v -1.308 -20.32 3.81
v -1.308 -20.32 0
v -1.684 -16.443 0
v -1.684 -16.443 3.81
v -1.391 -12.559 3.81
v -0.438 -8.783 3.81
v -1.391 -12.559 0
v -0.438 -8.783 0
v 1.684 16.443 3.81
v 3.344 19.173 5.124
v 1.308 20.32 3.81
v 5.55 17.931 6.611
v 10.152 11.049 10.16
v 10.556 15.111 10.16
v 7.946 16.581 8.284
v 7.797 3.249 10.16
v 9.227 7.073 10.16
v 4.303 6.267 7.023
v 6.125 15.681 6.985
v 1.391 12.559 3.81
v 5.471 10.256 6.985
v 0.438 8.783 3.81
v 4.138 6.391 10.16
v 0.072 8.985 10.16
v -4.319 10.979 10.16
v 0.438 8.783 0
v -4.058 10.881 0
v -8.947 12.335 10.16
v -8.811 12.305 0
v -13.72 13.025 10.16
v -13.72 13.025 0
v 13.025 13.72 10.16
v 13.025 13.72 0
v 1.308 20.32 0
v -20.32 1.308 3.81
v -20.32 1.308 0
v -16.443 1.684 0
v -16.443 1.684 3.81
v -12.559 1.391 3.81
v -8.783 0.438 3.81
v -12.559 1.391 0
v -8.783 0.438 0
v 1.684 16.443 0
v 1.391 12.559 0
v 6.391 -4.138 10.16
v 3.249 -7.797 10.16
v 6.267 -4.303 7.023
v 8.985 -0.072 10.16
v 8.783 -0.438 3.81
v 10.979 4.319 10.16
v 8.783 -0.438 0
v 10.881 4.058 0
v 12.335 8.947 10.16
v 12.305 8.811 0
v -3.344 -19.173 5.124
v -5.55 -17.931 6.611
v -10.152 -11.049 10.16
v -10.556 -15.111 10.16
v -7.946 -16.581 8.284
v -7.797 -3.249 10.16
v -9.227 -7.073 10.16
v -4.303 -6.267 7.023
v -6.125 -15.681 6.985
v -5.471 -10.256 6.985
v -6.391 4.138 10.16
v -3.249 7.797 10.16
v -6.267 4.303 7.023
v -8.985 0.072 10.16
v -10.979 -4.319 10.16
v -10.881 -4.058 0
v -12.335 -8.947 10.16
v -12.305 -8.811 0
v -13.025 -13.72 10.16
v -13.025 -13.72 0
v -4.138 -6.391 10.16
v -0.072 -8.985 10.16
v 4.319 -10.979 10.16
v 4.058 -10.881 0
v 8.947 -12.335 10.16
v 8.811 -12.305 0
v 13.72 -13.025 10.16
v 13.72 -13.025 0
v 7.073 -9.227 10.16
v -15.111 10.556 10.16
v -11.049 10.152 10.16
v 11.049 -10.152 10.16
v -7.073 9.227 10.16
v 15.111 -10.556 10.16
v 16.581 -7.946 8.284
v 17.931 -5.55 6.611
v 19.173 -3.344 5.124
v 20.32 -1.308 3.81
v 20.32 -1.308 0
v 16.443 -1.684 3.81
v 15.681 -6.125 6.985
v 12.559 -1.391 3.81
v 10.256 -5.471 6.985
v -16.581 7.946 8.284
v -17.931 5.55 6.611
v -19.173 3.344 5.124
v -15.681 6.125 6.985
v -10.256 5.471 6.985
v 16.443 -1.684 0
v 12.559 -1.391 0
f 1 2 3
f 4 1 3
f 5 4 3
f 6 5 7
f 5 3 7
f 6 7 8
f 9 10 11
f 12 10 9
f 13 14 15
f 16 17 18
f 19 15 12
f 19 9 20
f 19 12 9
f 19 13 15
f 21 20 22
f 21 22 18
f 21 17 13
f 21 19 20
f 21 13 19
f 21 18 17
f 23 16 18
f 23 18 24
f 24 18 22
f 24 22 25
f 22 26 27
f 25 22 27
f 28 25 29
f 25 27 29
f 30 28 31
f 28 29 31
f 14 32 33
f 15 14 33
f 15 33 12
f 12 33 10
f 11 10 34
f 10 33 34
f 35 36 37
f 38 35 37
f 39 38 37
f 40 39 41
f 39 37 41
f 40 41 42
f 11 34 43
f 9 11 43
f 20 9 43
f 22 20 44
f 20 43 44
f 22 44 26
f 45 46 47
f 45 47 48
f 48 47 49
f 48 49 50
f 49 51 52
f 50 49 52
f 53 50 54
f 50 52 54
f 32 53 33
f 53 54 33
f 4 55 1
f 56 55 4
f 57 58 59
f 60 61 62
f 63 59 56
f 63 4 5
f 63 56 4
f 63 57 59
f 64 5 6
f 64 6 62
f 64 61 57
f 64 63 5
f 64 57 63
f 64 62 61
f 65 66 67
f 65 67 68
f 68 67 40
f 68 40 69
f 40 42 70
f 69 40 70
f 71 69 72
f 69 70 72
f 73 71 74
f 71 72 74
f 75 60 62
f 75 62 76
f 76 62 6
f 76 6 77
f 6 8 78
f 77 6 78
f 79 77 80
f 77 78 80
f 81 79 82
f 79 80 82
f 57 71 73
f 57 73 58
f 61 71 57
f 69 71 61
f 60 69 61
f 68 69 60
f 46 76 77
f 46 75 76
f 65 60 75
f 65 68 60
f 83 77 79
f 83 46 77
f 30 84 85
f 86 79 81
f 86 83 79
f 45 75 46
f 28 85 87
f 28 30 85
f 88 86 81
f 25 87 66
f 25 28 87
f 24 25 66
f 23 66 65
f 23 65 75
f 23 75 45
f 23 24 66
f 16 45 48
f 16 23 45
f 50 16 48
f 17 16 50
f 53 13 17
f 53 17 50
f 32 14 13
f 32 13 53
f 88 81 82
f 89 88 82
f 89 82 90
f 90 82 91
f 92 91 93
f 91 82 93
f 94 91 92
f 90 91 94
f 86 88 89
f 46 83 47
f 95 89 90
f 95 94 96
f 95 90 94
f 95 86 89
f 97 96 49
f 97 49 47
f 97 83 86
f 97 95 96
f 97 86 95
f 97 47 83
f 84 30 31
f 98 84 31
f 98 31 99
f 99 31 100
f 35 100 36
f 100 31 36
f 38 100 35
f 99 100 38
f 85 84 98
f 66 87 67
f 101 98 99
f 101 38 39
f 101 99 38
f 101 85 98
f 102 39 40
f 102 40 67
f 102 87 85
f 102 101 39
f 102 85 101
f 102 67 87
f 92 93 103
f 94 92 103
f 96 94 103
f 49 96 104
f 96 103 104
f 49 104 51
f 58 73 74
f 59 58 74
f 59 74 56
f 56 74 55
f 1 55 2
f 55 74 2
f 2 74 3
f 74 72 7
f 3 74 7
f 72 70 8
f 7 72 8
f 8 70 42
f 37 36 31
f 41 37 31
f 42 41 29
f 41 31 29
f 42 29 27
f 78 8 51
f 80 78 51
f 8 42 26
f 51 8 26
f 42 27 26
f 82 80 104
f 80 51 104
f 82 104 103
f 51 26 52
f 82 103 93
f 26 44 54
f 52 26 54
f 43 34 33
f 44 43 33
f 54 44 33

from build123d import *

# Parameters (mm, degrees)
F1_DEPTH   = 10.16
F2_SIZE2   = 8.89
F2_SIZE    = 6.35
F2_2_SIZE2 = 8.89
F2_2_SIZE  = 6.35
F2_3_SIZE2 = 8.89
F2_3_SIZE  = 6.35
F2_4_SIZE2 = 8.89
F2_4_SIZE  = 6.35


with BuildPart() as f1:
    # F0 (on Top) → F1 (new body)
    with BuildSketch(Plane.XY):
        with BuildLine():
            ThreePointArc((8.7829506919, -0.4383031513), (8.1984738627, -0.2271154175), (7.62, 0))
            ThreePointArc((7.62, 0), (7.3212709923, -2.1126739117), (6.4485062842, -4.0597003218))
            ThreePointArc((6.4485062842, -4.0597003218), (7.6729486494, -2.2858873029), (8.7829506919, -0.4383031513))
        make_face()
        with BuildLine():
            ThreePointArc((4.0597003218, 6.4485062842), (6.670806415, 3.6830343161), (7.62, 0))
            ThreePointArc((7.62, 0), (8.1984738627, -0.2271154175), (8.7829506919, -0.4383031513))
            ThreePointArc((8.7829506919, -0.4383031513), (11.6797251248, 6.4085522926), (13.0247462226, 13.7202996782))
            Line((13.0247462226, 13.7202996782), (1.3079377533, 20.32))
            ThreePointArc((1.3079377533, 20.32), (1.6208295824, 14.4951148577), (0.4383031513, 8.7829506919))
            ThreePointArc((0.4383031513, 8.7829506919), (2.2858873029, 7.6729486494), (4.0597003218, 6.4485062842))
        make_face()
        with BuildLine():
            ThreePointArc((0, 7.62), (2.1126739117, 7.3212709923), (4.0597003218, 6.4485062842))
            ThreePointArc((4.0597003218, 6.4485062842), (2.2858873029, 7.6729486494), (0.4383031513, 8.7829506919))
            ThreePointArc((0.4383031513, 8.7829506919), (0.2271154175, 8.1984738627), (0, 7.62))
        make_face()
        with BuildLine():
            ThreePointArc((8.7829506919, -0.4383031513), (7.6729486494, -2.2858873029), (6.4485062842, -4.0597003218))
            ThreePointArc((6.4485062842, -4.0597003218), (3.6830343161, -6.670806415), (0, -7.62))
            ThreePointArc((0, -7.62), (-0.2271154175, -8.1984738627), (-0.4383031513, -8.7829506919))
            ThreePointArc((-0.4383031513, -8.7829506919), (6.4085522926, -11.6797251248), (13.7202996782, -13.0247462226))
            Line((13.7202996782, -13.0247462226), (20.32, -1.3079377533))
            ThreePointArc((20.32, -1.3079377533), (14.4951148577, -1.6208295824), (8.7829506919, -0.4383031513))
        make_face()
        with BuildLine():
            ThreePointArc((-6.4485062842, 4.0597003218), (-3.6830343161, 6.670806415), (0, 7.62))
            ThreePointArc((0, 7.62), (0.2271154175, 8.1984738627), (0.4383031513, 8.7829506919))
            ThreePointArc((0.4383031513, 8.7829506919), (-6.4085522926, 11.6797251248), (-13.7202996782, 13.0247462226))
            Line((-13.7202996782, 13.0247462226), (-20.32, 1.3079377533))
            ThreePointArc((-20.32, 1.3079377533), (-14.4951148577, 1.6208295824), (-8.7829506919, 0.4383031513))
            ThreePointArc((-8.7829506919, 0.4383031513), (-7.6729486494, 2.2858873029), (-6.4485062842, 4.0597003218))
        make_face()
        with BuildLine():
            ThreePointArc((-0.4383031513, -8.7829506919), (-0.2271154175, -8.1984738627), (0, -7.62))
            ThreePointArc((0, -7.62), (-2.1126739117, -7.3212709923), (-4.0597003218, -6.4485062842))
            ThreePointArc((-4.0597003218, -6.4485062842), (-2.2858873029, -7.6729486494), (-0.4383031513, -8.7829506919))
        make_face()
        with BuildLine():
            ThreePointArc((-7.62, 0), (-7.3212709923, 2.1126739117), (-6.4485062842, 4.0597003218))
            ThreePointArc((-6.4485062842, 4.0597003218), (-7.6729486494, 2.2858873029), (-8.7829506919, 0.4383031513))
            ThreePointArc((-8.7829506919, 0.4383031513), (-8.1984738627, 0.2271154175), (-7.62, 0))
        make_face()
        with BuildLine():
            ThreePointArc((-0.4383031513, -8.7829506919), (-2.2858873029, -7.6729486494), (-4.0597003218, -6.4485062842))
            ThreePointArc((-4.0597003218, -6.4485062842), (-6.670806415, -3.6830343161), (-7.62, 0))
            ThreePointArc((-7.62, 0), (-8.1984738627, 0.2271154175), (-8.7829506919, 0.4383031513))
            ThreePointArc((-8.7829506919, 0.4383031513), (-11.6797251248, -6.4085522926), (-13.0247462226, -13.7202996782))
            Line((-13.0247462226, -13.7202996782), (-1.3079377533, -20.32))
            ThreePointArc((-1.3079377533, -20.32), (-1.6208295824, -14.4951148577), (-0.4383031513, -8.7829506919))
        make_face()
        with BuildLine():
            ThreePointArc((6.4485062842, -4.0597003218), (7.3212709923, -2.1126739117), (7.62, 0))
            ThreePointArc((7.62, 0), (6.670806415, 3.6830343161), (4.0597003218, 6.4485062842))
            ThreePointArc((4.0597003218, 6.4485062842), (2.1126739117, 7.3212709923), (0, 7.62))
            ThreePointArc((0, 7.62), (-3.6830343161, 6.670806415), (-6.4485062842, 4.0597003218))
            ThreePointArc((-6.4485062842, 4.0597003218), (-7.3212709923, 2.1126739117), (-7.62, 0))
            ThreePointArc((-7.62, 0), (-6.670806415, -3.6830343161), (-4.0597003218, -6.4485062842))
            ThreePointArc((-4.0597003218, -6.4485062842), (-2.1126739117, -7.3212709923), (0, -7.62))
            ThreePointArc((0, -7.62), (3.6830343161, -6.670806415), (6.4485062842, -4.0597003218))
        make_face()
    extrude(amount=F1_DEPTH)

    # F2
    f2_edges = [f1.edges().sort_by_distance(p)[0] for p in [
        (1.62083, 14.495115, 10.16),
    ]]
    f2_side = f1.faces().sort_by_distance((1.62083, 14.495115, 5.08))[0]
    chamfer(f2_edges, length=F2_SIZE, length2=F2_SIZE2, reference=f2_side)

    # F2#2
    f2_2_edges = [f1.edges().sort_by_distance(p)[0] for p in [
        (-14.495115, 1.62083, 10.16),
    ]]
    f2_2_side = f1.faces().sort_by_distance((-14.495115, 1.62083, 5.08))[0]
    chamfer(f2_2_edges, length=F2_2_SIZE, length2=F2_2_SIZE2, reference=f2_2_side)

    # F2#3
    f2_3_edges = [f1.edges().sort_by_distance(p)[0] for p in [
        (-1.62083, -14.495115, 10.16),
    ]]
    f2_3_side = f1.faces().sort_by_distance((-1.62083, -14.495115, 5.08))[0]
    chamfer(f2_3_edges, length=F2_3_SIZE, length2=F2_3_SIZE2, reference=f2_3_side)

    # F2#4
    f2_4_edges = [f1.edges().sort_by_distance(p)[0] for p in [
        (14.495115, -1.62083, 10.16),
    ]]
    f2_4_side = f1.faces().sort_by_distance((14.495115, -1.62083, 5.08))[0]
    chamfer(f2_4_edges, length=F2_4_SIZE, length2=F2_4_SIZE2, reference=f2_4_side)


solid = f1.part
